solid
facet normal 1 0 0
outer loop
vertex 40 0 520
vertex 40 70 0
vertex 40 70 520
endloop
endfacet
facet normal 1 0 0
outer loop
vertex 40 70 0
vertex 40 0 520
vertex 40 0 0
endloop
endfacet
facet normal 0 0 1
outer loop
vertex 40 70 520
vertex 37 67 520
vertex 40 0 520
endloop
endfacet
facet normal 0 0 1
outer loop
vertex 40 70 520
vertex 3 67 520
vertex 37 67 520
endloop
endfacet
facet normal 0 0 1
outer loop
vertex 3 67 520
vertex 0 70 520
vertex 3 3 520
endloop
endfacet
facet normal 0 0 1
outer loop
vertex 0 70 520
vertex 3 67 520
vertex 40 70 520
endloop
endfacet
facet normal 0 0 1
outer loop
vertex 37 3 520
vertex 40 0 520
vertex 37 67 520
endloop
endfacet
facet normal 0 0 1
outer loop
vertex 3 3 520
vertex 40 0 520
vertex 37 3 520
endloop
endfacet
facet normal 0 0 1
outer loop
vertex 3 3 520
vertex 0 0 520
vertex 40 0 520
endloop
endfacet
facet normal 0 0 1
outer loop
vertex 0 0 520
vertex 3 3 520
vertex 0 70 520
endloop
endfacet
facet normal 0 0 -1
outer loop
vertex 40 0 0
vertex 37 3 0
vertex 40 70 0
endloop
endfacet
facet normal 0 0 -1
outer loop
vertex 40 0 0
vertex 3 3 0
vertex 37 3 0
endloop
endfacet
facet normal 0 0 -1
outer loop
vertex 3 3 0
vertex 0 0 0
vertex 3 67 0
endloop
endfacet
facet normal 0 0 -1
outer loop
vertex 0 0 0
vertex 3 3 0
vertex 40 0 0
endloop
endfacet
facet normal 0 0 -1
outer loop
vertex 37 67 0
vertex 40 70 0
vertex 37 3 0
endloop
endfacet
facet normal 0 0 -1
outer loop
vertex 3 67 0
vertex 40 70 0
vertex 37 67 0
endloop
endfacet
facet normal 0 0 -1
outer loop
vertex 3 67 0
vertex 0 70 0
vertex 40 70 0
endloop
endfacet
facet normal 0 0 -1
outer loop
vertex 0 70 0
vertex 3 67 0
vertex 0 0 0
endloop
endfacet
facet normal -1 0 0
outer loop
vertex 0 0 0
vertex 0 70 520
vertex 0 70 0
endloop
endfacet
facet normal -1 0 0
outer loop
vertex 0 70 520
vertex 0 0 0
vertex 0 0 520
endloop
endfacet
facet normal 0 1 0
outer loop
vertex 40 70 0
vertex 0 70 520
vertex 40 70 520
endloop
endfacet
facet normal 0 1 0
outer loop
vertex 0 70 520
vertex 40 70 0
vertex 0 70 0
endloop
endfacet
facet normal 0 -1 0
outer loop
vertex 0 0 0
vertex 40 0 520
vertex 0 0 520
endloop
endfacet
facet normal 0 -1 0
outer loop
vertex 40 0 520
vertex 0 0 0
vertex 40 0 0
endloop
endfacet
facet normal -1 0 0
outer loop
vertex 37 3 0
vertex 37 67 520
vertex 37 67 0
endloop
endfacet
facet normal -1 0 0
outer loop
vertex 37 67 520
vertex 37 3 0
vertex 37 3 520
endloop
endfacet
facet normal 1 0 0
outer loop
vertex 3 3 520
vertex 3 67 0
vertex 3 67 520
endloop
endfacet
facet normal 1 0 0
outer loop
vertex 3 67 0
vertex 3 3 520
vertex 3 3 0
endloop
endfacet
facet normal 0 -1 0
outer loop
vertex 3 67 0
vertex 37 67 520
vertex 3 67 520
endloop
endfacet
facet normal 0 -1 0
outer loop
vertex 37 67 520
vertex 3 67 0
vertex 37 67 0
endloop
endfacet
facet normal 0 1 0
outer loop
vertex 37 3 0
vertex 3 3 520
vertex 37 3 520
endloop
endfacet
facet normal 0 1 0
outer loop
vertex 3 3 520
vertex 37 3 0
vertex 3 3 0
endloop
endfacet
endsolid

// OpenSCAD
module perfil_h(dimx, dimy, length, width) {
    difference() {
        cube([dimx, dimy, length], center=false);
        translate([width, width, 0])
        cube([dimx - 2 * width, dimy - 2 * width, length], center=width,width,0);
        }
};
perfil_h(40, 70, 520, 3);
